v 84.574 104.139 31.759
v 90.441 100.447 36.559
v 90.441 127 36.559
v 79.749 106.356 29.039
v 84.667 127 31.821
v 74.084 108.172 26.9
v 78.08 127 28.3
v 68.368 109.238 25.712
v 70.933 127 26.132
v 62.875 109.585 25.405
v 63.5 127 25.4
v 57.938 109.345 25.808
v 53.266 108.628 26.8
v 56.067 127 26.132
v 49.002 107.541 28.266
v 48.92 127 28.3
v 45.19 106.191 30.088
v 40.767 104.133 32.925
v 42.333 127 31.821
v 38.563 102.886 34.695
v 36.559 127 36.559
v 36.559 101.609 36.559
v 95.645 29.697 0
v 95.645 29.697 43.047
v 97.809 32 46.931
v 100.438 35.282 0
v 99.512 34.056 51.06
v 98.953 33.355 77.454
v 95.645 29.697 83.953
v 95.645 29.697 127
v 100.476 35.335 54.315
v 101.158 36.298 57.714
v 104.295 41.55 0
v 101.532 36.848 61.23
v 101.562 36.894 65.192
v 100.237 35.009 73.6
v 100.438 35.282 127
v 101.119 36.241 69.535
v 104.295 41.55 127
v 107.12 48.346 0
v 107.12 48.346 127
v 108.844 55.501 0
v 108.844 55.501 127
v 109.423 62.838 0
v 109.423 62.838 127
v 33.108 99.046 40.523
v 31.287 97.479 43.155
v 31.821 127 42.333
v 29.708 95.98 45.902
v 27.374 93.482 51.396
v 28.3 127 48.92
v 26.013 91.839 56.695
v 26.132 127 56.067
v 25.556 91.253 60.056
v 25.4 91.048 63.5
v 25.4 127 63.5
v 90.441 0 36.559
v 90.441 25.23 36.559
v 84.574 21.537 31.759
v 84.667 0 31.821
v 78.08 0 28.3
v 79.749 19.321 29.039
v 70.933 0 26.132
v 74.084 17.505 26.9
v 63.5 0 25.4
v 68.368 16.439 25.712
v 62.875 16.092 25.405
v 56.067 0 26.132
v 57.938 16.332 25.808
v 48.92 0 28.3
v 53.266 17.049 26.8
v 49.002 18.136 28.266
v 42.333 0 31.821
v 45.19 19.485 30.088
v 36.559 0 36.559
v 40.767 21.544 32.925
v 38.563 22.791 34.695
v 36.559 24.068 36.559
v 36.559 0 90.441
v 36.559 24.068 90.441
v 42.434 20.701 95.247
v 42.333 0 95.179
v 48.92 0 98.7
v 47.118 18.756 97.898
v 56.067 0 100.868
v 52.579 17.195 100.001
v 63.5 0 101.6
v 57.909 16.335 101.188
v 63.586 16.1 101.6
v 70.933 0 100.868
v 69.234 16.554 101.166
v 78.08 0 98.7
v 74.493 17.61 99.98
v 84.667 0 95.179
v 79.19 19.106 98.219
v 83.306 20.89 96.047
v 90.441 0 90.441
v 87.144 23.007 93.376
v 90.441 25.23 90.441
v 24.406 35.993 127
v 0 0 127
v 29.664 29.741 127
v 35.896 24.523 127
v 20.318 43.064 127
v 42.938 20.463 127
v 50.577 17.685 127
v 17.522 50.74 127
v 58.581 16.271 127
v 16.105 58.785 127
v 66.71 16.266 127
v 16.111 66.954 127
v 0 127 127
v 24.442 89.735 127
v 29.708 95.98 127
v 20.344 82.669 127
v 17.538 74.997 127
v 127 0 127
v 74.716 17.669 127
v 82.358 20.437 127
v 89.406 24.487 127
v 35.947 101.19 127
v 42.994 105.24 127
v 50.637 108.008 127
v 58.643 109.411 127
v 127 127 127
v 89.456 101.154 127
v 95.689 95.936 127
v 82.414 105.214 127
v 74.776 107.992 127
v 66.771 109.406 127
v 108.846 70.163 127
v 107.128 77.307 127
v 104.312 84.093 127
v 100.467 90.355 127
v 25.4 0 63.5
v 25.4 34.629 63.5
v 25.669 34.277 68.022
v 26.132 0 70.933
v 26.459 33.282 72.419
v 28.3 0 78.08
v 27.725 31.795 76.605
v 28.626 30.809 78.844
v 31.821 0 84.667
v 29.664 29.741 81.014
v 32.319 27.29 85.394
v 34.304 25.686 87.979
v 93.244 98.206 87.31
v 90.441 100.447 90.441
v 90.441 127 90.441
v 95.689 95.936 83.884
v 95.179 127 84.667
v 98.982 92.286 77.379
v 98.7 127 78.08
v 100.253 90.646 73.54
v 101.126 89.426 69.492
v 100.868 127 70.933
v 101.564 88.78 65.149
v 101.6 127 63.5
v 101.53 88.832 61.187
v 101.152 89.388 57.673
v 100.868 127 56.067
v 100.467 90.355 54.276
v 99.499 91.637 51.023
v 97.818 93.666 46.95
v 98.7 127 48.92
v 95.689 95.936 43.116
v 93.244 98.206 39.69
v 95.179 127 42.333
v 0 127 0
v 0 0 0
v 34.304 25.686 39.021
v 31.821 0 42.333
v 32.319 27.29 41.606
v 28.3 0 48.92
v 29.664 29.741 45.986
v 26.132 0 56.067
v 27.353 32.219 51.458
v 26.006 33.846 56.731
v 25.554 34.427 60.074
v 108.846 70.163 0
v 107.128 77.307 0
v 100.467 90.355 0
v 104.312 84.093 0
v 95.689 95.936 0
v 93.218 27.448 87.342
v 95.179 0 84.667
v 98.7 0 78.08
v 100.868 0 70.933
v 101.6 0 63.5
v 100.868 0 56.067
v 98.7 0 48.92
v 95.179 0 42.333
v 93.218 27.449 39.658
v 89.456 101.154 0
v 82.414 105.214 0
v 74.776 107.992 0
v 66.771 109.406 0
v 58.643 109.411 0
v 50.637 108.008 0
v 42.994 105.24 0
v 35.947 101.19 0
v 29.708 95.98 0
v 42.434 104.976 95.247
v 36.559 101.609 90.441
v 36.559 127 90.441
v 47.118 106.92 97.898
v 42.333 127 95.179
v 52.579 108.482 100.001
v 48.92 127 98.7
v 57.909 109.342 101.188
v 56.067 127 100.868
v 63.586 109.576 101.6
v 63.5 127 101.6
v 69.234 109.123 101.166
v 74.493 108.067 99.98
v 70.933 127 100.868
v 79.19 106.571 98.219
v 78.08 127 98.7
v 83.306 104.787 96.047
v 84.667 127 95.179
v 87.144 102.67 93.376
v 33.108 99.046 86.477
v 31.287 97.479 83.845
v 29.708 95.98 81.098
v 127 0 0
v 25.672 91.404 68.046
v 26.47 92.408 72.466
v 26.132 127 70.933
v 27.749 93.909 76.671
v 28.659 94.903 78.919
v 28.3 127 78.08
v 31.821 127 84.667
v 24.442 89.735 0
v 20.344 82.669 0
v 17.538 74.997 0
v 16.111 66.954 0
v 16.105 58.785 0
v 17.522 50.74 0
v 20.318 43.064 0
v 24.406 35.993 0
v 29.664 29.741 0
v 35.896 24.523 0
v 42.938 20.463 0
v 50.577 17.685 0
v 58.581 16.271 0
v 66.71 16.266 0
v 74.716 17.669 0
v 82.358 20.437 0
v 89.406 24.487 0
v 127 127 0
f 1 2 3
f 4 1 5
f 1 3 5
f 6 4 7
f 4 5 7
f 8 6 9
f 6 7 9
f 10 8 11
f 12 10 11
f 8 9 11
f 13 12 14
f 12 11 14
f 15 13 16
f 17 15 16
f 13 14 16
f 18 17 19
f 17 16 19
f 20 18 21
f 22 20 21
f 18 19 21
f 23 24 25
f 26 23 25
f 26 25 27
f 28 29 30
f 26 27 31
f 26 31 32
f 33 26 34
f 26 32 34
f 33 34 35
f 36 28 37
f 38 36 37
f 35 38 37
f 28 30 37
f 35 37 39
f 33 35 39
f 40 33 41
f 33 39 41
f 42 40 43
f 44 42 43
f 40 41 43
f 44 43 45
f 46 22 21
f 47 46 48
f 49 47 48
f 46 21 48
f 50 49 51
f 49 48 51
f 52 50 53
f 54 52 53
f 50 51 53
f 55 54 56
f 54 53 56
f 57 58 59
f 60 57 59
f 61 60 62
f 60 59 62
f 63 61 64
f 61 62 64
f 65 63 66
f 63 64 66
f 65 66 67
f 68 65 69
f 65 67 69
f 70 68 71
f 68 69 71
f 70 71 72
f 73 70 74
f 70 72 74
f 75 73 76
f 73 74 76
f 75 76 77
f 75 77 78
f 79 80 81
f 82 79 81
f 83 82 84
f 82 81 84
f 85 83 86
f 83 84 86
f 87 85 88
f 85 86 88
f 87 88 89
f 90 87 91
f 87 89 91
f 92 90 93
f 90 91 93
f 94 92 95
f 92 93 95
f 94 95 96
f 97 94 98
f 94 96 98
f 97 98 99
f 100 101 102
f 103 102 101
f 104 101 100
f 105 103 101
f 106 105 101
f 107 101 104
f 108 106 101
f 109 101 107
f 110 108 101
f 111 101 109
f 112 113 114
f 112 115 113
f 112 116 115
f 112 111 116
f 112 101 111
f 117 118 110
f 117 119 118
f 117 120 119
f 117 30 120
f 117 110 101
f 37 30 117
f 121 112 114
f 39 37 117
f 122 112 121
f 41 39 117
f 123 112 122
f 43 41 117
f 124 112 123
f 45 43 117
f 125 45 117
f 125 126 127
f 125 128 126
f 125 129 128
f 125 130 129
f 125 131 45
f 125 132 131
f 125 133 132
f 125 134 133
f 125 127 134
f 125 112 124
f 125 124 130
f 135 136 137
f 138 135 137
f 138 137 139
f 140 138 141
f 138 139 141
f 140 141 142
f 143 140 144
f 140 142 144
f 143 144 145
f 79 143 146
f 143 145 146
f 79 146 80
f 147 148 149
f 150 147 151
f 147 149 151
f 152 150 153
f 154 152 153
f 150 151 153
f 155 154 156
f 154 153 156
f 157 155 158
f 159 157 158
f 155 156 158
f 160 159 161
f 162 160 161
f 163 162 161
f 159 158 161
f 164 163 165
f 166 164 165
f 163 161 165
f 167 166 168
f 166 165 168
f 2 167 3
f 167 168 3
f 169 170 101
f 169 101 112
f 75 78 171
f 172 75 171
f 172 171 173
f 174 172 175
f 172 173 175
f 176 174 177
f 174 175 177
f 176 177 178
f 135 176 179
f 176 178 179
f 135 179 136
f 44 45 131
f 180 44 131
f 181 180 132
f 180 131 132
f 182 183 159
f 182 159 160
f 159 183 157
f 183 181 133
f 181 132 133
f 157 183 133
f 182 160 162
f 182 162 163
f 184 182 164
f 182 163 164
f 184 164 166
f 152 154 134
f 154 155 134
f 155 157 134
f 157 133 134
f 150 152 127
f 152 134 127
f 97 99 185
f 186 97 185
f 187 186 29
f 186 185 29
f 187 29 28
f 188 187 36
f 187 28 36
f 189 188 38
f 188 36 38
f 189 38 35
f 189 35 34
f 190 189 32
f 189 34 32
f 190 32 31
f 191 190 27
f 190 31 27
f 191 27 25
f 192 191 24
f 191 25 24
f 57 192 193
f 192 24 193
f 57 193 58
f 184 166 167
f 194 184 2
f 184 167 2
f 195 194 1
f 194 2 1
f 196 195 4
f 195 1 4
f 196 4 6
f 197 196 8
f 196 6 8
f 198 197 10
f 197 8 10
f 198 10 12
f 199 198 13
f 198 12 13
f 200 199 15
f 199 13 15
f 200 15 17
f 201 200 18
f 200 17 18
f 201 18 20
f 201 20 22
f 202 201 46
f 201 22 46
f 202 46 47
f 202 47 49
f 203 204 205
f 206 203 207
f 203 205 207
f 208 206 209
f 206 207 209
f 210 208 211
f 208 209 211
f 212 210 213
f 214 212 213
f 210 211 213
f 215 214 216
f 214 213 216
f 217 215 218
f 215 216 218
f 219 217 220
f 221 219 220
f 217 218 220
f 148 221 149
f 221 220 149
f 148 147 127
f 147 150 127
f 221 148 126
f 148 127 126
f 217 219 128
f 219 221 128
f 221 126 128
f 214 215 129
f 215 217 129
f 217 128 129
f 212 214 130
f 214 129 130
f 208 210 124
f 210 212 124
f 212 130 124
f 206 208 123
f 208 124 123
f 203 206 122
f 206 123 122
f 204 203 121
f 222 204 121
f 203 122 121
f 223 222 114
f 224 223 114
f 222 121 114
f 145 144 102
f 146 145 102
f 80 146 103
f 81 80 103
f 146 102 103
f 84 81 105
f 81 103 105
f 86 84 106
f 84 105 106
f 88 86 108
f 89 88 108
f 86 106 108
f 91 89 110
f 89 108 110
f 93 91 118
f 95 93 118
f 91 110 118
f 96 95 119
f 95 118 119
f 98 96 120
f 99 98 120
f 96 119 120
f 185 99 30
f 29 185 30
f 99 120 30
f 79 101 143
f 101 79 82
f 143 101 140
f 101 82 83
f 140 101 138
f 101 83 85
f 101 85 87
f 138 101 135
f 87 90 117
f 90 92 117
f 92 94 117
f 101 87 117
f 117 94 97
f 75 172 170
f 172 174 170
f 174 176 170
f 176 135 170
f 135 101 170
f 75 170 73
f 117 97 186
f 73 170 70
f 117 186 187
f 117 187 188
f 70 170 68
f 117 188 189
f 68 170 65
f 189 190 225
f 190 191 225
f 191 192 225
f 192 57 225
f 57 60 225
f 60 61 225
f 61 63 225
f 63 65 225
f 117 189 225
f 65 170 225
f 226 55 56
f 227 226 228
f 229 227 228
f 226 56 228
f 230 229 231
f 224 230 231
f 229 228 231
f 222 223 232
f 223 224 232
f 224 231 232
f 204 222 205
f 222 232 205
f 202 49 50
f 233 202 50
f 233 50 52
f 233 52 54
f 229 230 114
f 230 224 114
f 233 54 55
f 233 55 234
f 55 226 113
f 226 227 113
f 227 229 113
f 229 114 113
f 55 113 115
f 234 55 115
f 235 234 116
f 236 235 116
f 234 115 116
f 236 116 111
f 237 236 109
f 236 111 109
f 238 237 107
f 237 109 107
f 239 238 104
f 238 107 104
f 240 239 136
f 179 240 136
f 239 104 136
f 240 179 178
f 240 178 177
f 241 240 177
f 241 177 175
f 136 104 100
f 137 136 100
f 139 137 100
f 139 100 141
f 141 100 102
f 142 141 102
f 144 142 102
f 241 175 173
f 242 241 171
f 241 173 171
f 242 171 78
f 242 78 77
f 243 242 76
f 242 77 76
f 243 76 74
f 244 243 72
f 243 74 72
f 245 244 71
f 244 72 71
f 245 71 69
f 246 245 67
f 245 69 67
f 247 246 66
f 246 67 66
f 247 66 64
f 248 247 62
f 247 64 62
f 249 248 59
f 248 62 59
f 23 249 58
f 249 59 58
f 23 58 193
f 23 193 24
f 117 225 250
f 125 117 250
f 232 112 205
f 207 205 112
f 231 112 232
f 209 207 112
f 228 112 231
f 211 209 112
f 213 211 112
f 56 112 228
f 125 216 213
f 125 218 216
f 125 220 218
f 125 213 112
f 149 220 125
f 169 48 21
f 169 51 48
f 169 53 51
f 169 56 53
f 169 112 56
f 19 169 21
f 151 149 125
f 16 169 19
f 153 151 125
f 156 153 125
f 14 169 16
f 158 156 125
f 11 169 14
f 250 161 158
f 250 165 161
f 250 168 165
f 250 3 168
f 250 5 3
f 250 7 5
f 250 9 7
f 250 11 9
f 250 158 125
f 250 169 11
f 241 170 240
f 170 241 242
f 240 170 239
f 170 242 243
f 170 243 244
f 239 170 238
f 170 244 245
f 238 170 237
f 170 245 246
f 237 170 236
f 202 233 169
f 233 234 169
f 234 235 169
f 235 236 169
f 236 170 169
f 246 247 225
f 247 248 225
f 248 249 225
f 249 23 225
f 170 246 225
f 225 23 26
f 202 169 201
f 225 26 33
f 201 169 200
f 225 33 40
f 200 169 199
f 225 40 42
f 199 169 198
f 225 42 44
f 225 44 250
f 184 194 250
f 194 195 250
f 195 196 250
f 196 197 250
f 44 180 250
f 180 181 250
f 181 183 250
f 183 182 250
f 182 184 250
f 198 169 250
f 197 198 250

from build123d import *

# Parameters (mm, degrees)
F0_W      = 127
F0_H      = 127
F1_DEPTH  = 127
F4_DEPTH  = 127
F6_DEPTH  = 127
F8_DEPTH  = 127
F10_DEPTH = 127


with BuildPart() as f1:
    # F0 (on Top) → F1 (new body)
    with BuildSketch(Plane.XY):
        with Locations((63.5, 63.5)):
            Rectangle(F0_W, F0_H)
    extrude(amount=F1_DEPTH)

    # F3 (on face) → F4 (cut)
    with BuildSketch(Plane.XY.offset(127)):
        with BuildLine():
            ThreePointArc((95.688511, 95.936173), (62.707134, 109.585316), (29.707732, 95.979811))
            Line((29.707732, 95.979811), (62.676218, 62.838437))
            Line((62.676218, 62.838437), (95.688511, 95.936173))
        make_face()
        with BuildLine():
            Line((62.676218, 62.838437), (29.707732, 95.979811))
            ThreePointArc((29.707732, 95.979811), (15.929338, 62.869353), (29.663924, 29.7407))
            Line((29.663924, 29.7407), (62.676218, 62.838437))
        make_face()
        with BuildLine():
            Line((95.688511, 95.936173), (62.676218, 62.838437))
            Line((62.676218, 62.838437), (95.644703, 29.697063))
            ThreePointArc((95.644703, 29.697063), (105.841284, 44.892719), (109.423107, 62.838437))
            ThreePointArc((109.423107, 62.838437), (105.853143, 80.755602), (95.688511, 95.936173))
        make_face()
        with BuildLine():
            Line((95.644703, 29.697063), (62.676218, 62.838437))
            Line((62.676218, 62.838437), (29.663924, 29.7407))
            ThreePointArc((29.663924, 29.7407), (62.645301, 16.091557), (95.644703, 29.697063))
        make_face()
    extrude(amount=-F4_DEPTH, mode=Mode.SUBTRACT)

    # F5 (on face) → F6 (cut)
    with BuildSketch(Plane.YZ.offset(127)):
        with BuildLine():
            ThreePointArc((90.100624, 90.100624), (63.5, 101.118963), (36.899376, 90.100624))
            Line((36.899376, 90.100624), (63.5, 63.5))
            Line((63.5, 63.5), (90.100624, 90.100624))
        make_face()
        with BuildLine():
            Line((63.5, 63.5), (36.899376, 90.100624))
            ThreePointArc((36.899376, 90.100624), (25.881037, 63.5), (36.899376, 36.899376))
            Line((36.899376, 36.899376), (63.5, 63.5))
        make_face()
        with BuildLine():
            Line((90.100624, 90.100624), (63.5, 63.5))
            Line((63.5, 63.5), (90.100624, 36.899376))
            ThreePointArc((90.100624, 36.899376), (98.25539, 49.103846), (101.118963, 63.5))
            ThreePointArc((101.118963, 63.5), (98.25539, 77.896154), (90.100624, 90.100624))
        make_face()
        with BuildLine():
            Line((90.100624, 36.899376), (63.5, 63.5))
            Line((63.5, 63.5), (36.899376, 36.899376))
            ThreePointArc((36.899376, 36.899376), (63.5, 25.881037), (90.100624, 36.899376))
        make_face()
    extrude(amount=F6_DEPTH, mode=Mode.SUBTRACT)

    # F7 (on face) → F8 (cut)
    with BuildSketch(Plane.YZ.offset(127)):
        with BuildLine():
            ThreePointArc((92.47811, 92.47811), (63.5, 104.481236), (34.52189, 92.47811))
            Line((34.52189, 92.47811), (63.5, 63.5))
            Line((63.5, 63.5), (92.47811, 92.47811))
        make_face()
        with BuildLine():
            Line((63.5, 63.5), (34.52189, 92.47811))
            ThreePointArc((34.52189, 92.47811), (22.518764, 63.5), (34.52189, 34.52189))
            Line((34.52189, 34.52189), (63.5, 63.5))
        make_face()
        with BuildLine():
            Line((92.47811, 92.47811), (63.5, 63.5))
            Line((63.5, 63.5), (92.47811, 34.52189))
            ThreePointArc((92.47811, 34.52189), (101.361725, 47.81716), (104.481236, 63.5))
            ThreePointArc((104.481236, 63.5), (101.361725, 79.18284), (92.47811, 92.47811))
        make_face()
        with BuildLine():
            Line((92.47811, 34.52189), (63.5, 63.5))
            Line((63.5, 63.5), (34.52189, 34.52189))
            ThreePointArc((34.52189, 34.52189), (63.5, 22.518764), (92.47811, 34.52189))
        make_face()
    extrude(amount=F8_DEPTH, mode=Mode.SUBTRACT)

    # F9 (on face) → F10 (cut)
    with BuildSketch(Plane(origin=(0, 127, 0), x_dir=(-1, 0, 0), z_dir=(0, 1, 0))):
        with BuildLine():
            ThreePointArc((-90.440768, 90.440768), (-101.6, 63.5), (-90.440768, 36.559232))
            Line((-90.440768, 36.559232), (-63.5, 63.5))
            Line((-63.5, 63.5), (-90.440768, 90.440768))
        make_face()
        with BuildLine():
            Line((-63.5, 63.5), (-90.440768, 36.559232))
            ThreePointArc((-90.440768, 36.559232), (-63.5, 25.4), (-36.559232, 36.559232))
            Line((-36.559232, 36.559232), (-63.5, 63.5))
        make_face()
        with BuildLine():
            Line((-90.440768, 90.440768), (-63.5, 63.5))
            Line((-63.5, 63.5), (-36.559232, 90.440768))
            ThreePointArc((-36.559232, 90.440768), (-63.5, 101.6), (-90.440768, 90.440768))
        make_face()
        with BuildLine():
            Line((-36.559232, 90.440768), (-63.5, 63.5))
            Line((-63.5, 63.5), (-36.559232, 36.559232))
            ThreePointArc((-36.559232, 36.559232), (-28.30019, 48.919761), (-25.4, 63.5))
            ThreePointArc((-25.4, 63.5), (-28.30019, 78.080239), (-36.559232, 90.440768))
        make_face()
    extrude(amount=-F10_DEPTH, mode=Mode.SUBTRACT)


solid = f1.part
